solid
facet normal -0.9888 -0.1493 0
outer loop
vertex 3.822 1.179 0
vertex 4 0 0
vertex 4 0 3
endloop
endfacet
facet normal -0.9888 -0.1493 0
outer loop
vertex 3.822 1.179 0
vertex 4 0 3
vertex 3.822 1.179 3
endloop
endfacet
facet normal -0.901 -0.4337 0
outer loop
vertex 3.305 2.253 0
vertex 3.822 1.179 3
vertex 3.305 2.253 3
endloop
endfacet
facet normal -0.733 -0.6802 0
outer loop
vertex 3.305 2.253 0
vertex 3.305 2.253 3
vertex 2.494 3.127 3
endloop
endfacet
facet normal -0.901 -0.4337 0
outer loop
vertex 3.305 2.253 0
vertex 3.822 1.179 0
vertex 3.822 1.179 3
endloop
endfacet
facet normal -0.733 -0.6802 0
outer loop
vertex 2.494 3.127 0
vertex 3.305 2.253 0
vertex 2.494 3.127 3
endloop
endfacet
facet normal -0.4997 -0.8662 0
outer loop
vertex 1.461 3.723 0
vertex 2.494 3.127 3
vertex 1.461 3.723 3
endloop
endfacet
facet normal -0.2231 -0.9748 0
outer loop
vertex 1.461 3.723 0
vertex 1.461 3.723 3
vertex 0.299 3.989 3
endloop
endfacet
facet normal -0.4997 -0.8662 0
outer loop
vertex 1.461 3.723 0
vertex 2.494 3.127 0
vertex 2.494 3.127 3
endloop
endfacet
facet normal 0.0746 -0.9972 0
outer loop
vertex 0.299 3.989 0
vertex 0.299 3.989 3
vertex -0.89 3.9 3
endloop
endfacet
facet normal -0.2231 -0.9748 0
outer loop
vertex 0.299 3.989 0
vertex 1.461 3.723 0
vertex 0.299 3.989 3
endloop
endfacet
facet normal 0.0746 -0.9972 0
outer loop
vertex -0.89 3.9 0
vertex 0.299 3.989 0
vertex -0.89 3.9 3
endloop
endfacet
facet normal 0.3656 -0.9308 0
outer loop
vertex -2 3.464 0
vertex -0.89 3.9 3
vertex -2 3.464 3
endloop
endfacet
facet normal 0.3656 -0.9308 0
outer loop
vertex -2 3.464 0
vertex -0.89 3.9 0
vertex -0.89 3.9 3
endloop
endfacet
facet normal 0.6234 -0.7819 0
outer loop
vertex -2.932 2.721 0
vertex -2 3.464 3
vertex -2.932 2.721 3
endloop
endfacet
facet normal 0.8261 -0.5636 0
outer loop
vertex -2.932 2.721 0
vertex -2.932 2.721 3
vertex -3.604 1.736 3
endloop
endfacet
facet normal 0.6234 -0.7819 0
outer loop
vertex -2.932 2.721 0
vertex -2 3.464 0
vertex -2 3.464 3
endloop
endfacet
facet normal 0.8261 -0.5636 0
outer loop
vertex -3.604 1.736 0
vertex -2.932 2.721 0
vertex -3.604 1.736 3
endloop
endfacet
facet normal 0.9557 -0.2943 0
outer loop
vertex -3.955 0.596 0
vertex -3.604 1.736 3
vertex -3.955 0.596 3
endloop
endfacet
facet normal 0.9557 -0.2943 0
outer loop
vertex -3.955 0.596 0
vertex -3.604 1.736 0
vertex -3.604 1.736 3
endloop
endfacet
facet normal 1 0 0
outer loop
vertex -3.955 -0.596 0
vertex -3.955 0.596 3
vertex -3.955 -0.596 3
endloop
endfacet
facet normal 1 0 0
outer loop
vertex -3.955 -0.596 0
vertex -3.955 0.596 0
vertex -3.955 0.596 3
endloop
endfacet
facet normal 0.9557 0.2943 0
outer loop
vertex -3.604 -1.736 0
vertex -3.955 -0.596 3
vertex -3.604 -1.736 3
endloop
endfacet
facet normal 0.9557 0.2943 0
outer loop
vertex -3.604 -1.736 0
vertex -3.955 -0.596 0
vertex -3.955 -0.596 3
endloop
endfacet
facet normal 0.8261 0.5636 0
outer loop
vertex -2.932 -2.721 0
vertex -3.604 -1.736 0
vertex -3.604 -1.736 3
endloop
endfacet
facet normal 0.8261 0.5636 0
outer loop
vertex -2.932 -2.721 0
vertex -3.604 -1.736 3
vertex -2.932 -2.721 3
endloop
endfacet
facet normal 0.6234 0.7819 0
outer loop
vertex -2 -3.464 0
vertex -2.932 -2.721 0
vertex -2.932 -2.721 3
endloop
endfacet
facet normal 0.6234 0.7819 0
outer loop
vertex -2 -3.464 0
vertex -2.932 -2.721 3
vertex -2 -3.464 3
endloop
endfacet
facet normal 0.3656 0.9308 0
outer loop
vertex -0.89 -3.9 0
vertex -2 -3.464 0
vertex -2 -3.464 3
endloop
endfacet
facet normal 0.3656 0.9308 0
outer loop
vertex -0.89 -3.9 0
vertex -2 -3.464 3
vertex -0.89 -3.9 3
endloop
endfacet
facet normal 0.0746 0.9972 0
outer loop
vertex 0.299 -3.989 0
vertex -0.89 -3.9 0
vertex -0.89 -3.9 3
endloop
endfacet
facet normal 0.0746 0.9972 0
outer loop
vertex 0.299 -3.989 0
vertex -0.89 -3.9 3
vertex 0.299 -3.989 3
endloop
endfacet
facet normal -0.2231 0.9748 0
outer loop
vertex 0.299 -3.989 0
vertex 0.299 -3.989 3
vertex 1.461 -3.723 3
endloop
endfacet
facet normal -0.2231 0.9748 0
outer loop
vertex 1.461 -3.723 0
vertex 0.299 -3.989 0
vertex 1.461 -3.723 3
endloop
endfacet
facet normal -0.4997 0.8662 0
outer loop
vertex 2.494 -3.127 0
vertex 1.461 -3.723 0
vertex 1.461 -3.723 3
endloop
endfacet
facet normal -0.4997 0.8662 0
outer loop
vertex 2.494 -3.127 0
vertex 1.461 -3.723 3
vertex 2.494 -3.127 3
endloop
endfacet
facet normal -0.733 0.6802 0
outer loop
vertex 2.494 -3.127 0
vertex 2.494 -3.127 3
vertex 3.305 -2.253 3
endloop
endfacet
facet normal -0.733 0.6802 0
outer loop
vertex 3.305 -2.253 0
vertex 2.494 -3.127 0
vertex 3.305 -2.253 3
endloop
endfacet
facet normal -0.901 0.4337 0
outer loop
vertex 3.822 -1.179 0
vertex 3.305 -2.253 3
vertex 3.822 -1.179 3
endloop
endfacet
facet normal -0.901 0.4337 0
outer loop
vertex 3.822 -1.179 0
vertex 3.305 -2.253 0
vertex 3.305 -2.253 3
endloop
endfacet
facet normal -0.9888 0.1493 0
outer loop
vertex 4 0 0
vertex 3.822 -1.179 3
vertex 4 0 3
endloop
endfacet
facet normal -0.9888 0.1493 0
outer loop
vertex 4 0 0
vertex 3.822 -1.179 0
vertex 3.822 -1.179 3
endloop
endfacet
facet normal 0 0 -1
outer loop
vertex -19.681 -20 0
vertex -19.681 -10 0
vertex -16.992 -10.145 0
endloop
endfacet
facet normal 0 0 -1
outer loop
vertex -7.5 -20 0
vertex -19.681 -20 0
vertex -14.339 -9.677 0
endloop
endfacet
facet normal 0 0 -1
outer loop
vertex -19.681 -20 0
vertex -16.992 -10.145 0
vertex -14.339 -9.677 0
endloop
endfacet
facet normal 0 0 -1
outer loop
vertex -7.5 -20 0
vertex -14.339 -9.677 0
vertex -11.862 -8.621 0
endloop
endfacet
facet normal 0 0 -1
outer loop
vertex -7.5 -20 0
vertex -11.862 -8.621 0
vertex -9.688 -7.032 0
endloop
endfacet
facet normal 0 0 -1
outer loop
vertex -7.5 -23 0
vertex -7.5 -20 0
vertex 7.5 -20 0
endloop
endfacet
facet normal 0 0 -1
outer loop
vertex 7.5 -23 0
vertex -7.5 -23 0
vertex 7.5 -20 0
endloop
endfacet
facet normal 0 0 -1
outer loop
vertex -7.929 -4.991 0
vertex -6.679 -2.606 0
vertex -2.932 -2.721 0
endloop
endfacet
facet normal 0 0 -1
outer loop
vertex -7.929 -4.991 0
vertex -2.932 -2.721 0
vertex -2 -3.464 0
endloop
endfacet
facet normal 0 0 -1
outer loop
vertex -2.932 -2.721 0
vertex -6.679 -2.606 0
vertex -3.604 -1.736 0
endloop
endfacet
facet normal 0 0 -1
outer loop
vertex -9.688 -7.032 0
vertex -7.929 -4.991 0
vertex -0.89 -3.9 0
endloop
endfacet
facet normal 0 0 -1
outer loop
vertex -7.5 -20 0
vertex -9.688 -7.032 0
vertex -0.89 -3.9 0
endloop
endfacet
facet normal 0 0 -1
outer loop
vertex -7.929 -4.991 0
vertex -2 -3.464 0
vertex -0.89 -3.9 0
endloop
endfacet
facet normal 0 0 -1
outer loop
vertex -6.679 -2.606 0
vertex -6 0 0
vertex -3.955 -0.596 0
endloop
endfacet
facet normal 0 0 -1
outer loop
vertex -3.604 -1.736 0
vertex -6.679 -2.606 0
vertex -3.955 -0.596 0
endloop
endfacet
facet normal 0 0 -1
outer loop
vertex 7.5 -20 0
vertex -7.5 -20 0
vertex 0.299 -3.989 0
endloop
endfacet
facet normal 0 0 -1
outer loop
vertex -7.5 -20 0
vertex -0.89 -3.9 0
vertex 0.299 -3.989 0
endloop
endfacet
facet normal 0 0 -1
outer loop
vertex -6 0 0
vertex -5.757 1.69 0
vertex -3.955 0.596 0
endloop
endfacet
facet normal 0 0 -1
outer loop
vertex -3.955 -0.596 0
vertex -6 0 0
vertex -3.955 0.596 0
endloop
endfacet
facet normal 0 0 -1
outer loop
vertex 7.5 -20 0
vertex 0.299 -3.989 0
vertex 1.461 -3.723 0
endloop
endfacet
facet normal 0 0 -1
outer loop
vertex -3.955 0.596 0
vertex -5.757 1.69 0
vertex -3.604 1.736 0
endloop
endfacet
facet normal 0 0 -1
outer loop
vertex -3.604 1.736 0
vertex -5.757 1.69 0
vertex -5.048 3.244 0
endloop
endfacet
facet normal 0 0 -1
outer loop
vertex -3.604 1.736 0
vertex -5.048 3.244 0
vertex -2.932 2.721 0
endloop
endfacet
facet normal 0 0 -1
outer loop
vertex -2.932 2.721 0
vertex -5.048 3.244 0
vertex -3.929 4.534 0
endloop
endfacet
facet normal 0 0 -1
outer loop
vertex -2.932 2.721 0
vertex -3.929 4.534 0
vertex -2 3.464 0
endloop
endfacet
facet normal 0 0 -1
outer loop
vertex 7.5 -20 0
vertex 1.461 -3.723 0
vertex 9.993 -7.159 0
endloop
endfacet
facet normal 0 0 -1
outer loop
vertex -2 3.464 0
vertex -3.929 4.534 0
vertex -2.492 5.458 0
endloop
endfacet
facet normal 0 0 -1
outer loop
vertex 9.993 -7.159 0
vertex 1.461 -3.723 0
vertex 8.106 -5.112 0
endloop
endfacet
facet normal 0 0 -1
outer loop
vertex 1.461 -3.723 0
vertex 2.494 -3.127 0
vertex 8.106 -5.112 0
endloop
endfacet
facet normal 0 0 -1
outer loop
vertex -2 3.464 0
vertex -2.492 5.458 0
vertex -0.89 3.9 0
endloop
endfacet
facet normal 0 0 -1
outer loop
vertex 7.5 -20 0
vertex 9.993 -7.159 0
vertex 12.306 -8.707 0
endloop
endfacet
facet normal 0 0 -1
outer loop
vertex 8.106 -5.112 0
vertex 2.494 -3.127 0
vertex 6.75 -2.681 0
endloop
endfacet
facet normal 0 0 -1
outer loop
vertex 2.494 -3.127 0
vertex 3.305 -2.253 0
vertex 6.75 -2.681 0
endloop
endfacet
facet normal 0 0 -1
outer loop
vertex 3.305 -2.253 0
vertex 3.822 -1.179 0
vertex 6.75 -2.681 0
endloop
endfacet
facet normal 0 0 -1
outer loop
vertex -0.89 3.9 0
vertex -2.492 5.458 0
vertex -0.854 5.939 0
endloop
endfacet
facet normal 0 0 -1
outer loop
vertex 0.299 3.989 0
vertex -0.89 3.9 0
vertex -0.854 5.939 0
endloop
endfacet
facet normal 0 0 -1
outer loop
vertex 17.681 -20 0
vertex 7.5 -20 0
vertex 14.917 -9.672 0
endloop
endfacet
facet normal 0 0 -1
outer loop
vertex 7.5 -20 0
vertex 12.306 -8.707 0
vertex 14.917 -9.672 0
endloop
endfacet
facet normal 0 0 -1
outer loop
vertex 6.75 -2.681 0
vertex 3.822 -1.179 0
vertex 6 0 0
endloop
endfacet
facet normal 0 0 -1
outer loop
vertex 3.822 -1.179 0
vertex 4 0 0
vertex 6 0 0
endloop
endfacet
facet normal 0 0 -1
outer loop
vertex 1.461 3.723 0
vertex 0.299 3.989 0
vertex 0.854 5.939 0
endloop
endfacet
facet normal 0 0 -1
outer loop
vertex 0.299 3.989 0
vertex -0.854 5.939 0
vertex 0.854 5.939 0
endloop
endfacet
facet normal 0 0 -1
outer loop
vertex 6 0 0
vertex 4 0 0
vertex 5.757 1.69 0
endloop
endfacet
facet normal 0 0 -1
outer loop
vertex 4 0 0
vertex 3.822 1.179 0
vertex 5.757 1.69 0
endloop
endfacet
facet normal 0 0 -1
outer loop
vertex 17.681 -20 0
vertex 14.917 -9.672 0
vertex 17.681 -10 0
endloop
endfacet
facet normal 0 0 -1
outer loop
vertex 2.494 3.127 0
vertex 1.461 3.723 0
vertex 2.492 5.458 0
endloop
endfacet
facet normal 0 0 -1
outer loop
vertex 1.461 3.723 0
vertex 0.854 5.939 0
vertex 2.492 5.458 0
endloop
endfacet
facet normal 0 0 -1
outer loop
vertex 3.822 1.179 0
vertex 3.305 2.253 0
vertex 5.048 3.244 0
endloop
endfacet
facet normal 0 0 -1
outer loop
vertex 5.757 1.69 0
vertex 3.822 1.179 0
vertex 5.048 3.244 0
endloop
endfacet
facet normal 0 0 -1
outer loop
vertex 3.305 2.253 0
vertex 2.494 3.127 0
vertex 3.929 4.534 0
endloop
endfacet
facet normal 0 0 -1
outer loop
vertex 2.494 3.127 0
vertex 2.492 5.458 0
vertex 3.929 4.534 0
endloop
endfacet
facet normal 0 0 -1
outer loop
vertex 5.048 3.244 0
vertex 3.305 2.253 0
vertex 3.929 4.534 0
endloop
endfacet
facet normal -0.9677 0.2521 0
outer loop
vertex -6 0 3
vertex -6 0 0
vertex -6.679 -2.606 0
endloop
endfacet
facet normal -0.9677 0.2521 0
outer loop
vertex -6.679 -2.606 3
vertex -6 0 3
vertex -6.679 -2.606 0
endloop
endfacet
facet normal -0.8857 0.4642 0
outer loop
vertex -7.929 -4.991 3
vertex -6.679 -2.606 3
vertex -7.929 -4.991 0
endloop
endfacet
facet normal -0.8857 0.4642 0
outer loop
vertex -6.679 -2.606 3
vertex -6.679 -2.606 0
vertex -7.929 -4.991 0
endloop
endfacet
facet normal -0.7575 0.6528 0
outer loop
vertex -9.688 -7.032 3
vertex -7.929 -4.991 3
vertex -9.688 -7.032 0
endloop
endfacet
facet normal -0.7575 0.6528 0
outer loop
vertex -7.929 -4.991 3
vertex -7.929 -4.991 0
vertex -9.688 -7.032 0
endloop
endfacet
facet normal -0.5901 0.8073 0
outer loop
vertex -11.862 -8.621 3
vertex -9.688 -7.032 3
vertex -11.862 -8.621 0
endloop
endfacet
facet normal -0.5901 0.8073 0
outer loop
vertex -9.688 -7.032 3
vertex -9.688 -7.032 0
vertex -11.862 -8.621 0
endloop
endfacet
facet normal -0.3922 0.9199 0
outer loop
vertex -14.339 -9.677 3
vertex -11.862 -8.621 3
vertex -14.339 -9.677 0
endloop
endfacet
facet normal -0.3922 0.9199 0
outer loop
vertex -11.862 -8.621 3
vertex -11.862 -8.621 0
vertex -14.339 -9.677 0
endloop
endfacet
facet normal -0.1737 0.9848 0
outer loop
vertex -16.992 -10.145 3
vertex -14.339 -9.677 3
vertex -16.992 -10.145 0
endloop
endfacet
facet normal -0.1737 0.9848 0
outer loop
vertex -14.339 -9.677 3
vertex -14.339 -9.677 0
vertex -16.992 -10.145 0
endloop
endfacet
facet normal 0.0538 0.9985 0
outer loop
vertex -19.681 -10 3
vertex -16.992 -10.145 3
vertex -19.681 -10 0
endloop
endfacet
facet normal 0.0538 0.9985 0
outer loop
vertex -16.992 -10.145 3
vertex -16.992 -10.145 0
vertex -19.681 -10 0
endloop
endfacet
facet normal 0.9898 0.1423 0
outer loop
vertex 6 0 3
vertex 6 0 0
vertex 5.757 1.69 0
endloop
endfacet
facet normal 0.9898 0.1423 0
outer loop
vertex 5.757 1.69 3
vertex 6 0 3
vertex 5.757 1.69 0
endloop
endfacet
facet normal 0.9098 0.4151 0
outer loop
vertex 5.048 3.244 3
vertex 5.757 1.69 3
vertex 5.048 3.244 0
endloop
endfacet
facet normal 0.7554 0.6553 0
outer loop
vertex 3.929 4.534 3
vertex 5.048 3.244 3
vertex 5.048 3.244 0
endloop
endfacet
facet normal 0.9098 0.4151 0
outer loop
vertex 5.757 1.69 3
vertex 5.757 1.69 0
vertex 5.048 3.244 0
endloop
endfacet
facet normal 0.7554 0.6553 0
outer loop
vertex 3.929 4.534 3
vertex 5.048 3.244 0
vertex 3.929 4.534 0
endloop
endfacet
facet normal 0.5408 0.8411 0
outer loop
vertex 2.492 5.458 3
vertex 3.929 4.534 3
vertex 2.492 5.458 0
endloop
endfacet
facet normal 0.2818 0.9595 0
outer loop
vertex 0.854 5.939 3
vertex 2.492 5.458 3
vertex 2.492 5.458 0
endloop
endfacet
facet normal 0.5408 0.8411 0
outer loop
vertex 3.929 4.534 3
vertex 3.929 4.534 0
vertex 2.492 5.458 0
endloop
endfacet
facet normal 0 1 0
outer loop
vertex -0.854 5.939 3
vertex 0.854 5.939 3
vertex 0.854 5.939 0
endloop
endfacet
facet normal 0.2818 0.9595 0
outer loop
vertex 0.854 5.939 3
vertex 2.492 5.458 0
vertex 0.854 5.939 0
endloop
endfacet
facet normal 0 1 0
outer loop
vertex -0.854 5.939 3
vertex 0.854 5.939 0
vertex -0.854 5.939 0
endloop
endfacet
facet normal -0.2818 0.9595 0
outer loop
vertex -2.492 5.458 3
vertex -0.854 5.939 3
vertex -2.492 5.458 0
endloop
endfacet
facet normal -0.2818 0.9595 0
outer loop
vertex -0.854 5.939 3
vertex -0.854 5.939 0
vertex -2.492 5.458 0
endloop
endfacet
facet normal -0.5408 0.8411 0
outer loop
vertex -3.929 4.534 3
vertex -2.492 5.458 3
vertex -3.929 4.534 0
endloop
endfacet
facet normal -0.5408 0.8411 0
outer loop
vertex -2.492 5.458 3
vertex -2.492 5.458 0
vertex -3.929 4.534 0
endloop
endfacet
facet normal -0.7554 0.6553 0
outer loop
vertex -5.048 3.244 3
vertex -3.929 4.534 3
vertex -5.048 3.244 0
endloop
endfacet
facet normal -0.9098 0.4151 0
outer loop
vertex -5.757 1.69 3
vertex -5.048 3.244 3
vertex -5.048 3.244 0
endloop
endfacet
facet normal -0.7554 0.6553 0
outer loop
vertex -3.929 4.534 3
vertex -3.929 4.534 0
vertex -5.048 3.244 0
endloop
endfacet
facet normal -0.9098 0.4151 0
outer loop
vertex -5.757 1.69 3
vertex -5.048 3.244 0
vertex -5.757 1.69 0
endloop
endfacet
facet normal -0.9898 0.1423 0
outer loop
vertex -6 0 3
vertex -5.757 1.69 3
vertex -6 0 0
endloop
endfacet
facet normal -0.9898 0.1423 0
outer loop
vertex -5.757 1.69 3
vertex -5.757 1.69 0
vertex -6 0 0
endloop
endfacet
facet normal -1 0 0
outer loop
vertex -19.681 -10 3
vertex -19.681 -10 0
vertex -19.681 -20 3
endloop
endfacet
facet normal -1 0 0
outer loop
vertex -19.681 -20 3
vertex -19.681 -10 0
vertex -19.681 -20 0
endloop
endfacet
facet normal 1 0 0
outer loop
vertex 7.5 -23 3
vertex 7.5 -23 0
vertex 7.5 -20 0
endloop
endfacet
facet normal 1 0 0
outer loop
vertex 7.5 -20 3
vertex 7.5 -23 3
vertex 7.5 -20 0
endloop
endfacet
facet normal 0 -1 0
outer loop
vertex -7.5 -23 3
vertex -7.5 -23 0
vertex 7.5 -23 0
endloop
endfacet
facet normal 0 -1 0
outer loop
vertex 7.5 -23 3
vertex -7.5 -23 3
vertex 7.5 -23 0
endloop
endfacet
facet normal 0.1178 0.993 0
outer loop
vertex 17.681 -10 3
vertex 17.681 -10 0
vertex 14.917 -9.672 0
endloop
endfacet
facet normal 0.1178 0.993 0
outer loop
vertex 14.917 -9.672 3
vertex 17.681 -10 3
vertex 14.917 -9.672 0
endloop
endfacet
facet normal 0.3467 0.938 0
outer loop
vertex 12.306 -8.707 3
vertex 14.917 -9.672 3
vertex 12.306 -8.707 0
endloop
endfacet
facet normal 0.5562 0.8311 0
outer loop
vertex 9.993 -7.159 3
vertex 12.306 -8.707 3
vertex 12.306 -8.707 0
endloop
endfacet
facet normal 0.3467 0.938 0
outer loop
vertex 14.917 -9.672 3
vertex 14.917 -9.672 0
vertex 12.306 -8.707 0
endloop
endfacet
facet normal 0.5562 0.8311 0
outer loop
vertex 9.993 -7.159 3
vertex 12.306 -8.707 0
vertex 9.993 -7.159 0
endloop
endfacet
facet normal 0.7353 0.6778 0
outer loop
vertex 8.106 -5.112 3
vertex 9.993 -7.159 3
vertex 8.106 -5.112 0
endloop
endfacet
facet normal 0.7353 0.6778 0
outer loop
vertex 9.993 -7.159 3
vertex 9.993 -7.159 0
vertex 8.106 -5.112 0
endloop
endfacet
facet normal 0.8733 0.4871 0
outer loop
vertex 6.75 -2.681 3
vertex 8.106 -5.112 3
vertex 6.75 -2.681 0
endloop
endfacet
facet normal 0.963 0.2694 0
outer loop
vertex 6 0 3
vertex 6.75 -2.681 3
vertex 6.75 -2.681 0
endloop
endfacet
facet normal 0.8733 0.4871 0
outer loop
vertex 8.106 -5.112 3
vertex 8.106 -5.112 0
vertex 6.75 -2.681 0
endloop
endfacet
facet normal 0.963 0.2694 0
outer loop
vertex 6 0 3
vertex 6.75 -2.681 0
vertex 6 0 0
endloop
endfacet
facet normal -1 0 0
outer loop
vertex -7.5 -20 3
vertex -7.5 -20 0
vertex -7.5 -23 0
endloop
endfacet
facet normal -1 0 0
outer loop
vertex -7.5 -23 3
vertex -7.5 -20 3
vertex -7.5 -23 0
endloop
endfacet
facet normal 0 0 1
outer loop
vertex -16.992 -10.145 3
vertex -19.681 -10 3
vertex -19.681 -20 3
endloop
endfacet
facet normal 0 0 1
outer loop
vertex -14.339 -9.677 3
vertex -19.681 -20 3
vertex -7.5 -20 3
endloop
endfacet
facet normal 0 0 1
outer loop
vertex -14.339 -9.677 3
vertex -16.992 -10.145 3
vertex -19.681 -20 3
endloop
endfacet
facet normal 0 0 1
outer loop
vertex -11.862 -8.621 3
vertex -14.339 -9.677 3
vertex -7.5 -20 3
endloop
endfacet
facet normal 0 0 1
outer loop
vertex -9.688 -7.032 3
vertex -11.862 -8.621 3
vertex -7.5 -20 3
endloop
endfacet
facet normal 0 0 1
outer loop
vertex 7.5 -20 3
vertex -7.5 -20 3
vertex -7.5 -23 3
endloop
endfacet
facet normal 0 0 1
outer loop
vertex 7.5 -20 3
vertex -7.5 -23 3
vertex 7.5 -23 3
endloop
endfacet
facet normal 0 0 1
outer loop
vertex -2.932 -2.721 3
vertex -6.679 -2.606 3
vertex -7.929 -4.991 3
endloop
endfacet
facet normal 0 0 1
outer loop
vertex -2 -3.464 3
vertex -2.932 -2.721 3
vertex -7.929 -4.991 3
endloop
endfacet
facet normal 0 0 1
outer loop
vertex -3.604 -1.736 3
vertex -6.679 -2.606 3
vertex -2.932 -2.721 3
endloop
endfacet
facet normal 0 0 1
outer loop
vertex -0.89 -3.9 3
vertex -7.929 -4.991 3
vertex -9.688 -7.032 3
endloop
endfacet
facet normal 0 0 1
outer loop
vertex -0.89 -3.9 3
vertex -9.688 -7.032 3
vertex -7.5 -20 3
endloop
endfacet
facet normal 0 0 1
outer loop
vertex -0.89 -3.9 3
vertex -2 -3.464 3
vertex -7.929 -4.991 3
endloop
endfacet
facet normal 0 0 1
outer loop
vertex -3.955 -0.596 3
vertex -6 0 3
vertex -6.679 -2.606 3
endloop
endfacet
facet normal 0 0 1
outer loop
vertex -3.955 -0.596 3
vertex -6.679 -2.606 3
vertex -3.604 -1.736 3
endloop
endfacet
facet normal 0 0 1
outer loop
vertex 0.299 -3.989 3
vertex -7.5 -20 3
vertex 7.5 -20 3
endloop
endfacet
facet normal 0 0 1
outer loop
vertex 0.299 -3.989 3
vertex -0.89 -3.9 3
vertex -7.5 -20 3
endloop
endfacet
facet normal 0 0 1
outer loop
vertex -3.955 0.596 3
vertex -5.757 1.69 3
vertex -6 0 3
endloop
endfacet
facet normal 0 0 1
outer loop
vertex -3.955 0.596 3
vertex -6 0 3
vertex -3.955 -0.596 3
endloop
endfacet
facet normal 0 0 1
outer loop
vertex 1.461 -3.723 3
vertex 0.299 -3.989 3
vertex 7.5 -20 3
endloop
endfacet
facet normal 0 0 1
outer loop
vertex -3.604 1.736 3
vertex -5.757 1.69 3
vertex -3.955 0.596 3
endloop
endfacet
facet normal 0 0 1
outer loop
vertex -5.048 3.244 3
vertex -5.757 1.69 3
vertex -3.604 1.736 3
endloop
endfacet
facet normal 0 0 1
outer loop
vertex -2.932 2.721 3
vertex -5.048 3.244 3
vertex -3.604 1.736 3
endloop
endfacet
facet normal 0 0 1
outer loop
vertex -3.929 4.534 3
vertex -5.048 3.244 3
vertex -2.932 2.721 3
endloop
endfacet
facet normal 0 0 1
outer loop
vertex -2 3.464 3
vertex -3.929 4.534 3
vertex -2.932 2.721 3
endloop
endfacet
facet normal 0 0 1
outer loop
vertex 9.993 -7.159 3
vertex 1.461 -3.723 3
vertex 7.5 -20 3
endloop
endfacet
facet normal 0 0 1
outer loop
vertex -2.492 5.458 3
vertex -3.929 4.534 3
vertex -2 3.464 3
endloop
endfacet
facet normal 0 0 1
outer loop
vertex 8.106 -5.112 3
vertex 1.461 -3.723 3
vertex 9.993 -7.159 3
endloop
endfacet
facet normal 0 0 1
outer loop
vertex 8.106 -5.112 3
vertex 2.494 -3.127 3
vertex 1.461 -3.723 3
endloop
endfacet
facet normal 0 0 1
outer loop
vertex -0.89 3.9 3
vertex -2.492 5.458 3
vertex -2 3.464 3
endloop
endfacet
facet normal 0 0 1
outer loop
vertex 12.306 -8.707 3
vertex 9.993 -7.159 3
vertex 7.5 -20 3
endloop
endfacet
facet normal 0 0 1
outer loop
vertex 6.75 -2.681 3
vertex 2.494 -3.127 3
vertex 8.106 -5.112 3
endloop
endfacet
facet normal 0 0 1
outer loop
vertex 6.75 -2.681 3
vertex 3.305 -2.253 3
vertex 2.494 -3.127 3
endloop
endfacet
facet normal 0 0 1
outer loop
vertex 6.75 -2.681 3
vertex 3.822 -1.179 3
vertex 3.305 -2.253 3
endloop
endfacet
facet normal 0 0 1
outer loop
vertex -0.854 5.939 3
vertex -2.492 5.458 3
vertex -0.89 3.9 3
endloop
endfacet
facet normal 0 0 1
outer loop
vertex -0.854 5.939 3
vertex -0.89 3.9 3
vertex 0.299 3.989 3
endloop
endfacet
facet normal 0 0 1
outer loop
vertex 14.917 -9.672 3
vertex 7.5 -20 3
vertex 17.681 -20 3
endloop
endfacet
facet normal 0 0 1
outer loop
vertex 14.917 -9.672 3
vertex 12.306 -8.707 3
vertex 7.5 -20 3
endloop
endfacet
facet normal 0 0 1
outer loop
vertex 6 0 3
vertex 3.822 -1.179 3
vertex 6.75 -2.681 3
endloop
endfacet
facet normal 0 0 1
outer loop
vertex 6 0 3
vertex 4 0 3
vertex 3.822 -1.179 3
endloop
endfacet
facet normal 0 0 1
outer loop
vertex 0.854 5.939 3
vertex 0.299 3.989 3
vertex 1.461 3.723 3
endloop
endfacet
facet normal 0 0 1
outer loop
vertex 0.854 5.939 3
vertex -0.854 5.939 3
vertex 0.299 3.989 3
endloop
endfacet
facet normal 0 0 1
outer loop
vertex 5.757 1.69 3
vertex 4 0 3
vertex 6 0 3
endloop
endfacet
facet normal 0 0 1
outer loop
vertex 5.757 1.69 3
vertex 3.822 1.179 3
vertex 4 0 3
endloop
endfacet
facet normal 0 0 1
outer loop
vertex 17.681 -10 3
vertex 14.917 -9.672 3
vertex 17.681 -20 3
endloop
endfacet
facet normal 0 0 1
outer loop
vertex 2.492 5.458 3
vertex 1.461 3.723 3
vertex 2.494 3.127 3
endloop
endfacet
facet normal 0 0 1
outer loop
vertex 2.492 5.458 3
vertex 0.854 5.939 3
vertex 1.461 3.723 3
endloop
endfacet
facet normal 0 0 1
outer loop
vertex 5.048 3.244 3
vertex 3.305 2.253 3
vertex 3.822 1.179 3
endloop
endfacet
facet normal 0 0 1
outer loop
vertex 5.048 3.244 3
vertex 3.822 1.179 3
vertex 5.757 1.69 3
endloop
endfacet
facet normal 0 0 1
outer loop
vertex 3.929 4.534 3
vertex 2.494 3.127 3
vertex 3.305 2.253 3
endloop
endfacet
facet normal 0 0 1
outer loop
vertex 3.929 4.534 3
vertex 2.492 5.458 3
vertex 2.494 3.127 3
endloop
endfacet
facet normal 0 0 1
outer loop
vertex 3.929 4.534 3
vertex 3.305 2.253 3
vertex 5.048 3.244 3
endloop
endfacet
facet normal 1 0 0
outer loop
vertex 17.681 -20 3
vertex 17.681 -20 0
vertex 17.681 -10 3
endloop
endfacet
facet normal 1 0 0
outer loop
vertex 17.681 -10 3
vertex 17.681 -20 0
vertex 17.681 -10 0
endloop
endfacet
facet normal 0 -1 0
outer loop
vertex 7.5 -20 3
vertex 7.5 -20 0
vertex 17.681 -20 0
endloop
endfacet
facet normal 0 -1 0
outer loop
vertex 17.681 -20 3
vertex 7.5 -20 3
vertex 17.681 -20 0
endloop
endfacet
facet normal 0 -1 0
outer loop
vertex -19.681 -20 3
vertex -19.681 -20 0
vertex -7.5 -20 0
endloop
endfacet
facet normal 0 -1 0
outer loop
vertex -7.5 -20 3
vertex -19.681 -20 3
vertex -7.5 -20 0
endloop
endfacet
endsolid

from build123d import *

# Parameters (mm, degrees)
SKETCH1_R           = 4
BOSS_EXTRUDE1_DEPTH = 3


with BuildPart() as part:
    # Sketch1 → Boss-Extrude1 (new body)
    with BuildSketch(Plane.XY):
        with BuildLine():
            Line((7.5, -20), (17.681043382, -20))
            Line((17.681043382, -20), (17.681043382, -10))
            ThreePointArc((17.681043382, -10), (9.992620207, -7.15854174), (6, 0))
            ThreePointArc((6, 0), (0, 6), (-6, 0))
            ThreePointArc((-6, 0), (-10.729319879, -7.888344359), (-19.681043382, -10))
            Line((-19.681043382, -10), (-19.681043382, -20))
            Line((-19.681043382, -20), (-7.5, -20))
            Line((-7.5, -20), (-7.5, -23))
            Line((-7.5, -23), (7.5, -23))
            Line((7.5, -23), (7.5, -20))
        make_face()
        Circle(SKETCH1_R, mode=Mode.SUBTRACT)
    extrude(amount=BOSS_EXTRUDE1_DEPTH)


solid = part.part
